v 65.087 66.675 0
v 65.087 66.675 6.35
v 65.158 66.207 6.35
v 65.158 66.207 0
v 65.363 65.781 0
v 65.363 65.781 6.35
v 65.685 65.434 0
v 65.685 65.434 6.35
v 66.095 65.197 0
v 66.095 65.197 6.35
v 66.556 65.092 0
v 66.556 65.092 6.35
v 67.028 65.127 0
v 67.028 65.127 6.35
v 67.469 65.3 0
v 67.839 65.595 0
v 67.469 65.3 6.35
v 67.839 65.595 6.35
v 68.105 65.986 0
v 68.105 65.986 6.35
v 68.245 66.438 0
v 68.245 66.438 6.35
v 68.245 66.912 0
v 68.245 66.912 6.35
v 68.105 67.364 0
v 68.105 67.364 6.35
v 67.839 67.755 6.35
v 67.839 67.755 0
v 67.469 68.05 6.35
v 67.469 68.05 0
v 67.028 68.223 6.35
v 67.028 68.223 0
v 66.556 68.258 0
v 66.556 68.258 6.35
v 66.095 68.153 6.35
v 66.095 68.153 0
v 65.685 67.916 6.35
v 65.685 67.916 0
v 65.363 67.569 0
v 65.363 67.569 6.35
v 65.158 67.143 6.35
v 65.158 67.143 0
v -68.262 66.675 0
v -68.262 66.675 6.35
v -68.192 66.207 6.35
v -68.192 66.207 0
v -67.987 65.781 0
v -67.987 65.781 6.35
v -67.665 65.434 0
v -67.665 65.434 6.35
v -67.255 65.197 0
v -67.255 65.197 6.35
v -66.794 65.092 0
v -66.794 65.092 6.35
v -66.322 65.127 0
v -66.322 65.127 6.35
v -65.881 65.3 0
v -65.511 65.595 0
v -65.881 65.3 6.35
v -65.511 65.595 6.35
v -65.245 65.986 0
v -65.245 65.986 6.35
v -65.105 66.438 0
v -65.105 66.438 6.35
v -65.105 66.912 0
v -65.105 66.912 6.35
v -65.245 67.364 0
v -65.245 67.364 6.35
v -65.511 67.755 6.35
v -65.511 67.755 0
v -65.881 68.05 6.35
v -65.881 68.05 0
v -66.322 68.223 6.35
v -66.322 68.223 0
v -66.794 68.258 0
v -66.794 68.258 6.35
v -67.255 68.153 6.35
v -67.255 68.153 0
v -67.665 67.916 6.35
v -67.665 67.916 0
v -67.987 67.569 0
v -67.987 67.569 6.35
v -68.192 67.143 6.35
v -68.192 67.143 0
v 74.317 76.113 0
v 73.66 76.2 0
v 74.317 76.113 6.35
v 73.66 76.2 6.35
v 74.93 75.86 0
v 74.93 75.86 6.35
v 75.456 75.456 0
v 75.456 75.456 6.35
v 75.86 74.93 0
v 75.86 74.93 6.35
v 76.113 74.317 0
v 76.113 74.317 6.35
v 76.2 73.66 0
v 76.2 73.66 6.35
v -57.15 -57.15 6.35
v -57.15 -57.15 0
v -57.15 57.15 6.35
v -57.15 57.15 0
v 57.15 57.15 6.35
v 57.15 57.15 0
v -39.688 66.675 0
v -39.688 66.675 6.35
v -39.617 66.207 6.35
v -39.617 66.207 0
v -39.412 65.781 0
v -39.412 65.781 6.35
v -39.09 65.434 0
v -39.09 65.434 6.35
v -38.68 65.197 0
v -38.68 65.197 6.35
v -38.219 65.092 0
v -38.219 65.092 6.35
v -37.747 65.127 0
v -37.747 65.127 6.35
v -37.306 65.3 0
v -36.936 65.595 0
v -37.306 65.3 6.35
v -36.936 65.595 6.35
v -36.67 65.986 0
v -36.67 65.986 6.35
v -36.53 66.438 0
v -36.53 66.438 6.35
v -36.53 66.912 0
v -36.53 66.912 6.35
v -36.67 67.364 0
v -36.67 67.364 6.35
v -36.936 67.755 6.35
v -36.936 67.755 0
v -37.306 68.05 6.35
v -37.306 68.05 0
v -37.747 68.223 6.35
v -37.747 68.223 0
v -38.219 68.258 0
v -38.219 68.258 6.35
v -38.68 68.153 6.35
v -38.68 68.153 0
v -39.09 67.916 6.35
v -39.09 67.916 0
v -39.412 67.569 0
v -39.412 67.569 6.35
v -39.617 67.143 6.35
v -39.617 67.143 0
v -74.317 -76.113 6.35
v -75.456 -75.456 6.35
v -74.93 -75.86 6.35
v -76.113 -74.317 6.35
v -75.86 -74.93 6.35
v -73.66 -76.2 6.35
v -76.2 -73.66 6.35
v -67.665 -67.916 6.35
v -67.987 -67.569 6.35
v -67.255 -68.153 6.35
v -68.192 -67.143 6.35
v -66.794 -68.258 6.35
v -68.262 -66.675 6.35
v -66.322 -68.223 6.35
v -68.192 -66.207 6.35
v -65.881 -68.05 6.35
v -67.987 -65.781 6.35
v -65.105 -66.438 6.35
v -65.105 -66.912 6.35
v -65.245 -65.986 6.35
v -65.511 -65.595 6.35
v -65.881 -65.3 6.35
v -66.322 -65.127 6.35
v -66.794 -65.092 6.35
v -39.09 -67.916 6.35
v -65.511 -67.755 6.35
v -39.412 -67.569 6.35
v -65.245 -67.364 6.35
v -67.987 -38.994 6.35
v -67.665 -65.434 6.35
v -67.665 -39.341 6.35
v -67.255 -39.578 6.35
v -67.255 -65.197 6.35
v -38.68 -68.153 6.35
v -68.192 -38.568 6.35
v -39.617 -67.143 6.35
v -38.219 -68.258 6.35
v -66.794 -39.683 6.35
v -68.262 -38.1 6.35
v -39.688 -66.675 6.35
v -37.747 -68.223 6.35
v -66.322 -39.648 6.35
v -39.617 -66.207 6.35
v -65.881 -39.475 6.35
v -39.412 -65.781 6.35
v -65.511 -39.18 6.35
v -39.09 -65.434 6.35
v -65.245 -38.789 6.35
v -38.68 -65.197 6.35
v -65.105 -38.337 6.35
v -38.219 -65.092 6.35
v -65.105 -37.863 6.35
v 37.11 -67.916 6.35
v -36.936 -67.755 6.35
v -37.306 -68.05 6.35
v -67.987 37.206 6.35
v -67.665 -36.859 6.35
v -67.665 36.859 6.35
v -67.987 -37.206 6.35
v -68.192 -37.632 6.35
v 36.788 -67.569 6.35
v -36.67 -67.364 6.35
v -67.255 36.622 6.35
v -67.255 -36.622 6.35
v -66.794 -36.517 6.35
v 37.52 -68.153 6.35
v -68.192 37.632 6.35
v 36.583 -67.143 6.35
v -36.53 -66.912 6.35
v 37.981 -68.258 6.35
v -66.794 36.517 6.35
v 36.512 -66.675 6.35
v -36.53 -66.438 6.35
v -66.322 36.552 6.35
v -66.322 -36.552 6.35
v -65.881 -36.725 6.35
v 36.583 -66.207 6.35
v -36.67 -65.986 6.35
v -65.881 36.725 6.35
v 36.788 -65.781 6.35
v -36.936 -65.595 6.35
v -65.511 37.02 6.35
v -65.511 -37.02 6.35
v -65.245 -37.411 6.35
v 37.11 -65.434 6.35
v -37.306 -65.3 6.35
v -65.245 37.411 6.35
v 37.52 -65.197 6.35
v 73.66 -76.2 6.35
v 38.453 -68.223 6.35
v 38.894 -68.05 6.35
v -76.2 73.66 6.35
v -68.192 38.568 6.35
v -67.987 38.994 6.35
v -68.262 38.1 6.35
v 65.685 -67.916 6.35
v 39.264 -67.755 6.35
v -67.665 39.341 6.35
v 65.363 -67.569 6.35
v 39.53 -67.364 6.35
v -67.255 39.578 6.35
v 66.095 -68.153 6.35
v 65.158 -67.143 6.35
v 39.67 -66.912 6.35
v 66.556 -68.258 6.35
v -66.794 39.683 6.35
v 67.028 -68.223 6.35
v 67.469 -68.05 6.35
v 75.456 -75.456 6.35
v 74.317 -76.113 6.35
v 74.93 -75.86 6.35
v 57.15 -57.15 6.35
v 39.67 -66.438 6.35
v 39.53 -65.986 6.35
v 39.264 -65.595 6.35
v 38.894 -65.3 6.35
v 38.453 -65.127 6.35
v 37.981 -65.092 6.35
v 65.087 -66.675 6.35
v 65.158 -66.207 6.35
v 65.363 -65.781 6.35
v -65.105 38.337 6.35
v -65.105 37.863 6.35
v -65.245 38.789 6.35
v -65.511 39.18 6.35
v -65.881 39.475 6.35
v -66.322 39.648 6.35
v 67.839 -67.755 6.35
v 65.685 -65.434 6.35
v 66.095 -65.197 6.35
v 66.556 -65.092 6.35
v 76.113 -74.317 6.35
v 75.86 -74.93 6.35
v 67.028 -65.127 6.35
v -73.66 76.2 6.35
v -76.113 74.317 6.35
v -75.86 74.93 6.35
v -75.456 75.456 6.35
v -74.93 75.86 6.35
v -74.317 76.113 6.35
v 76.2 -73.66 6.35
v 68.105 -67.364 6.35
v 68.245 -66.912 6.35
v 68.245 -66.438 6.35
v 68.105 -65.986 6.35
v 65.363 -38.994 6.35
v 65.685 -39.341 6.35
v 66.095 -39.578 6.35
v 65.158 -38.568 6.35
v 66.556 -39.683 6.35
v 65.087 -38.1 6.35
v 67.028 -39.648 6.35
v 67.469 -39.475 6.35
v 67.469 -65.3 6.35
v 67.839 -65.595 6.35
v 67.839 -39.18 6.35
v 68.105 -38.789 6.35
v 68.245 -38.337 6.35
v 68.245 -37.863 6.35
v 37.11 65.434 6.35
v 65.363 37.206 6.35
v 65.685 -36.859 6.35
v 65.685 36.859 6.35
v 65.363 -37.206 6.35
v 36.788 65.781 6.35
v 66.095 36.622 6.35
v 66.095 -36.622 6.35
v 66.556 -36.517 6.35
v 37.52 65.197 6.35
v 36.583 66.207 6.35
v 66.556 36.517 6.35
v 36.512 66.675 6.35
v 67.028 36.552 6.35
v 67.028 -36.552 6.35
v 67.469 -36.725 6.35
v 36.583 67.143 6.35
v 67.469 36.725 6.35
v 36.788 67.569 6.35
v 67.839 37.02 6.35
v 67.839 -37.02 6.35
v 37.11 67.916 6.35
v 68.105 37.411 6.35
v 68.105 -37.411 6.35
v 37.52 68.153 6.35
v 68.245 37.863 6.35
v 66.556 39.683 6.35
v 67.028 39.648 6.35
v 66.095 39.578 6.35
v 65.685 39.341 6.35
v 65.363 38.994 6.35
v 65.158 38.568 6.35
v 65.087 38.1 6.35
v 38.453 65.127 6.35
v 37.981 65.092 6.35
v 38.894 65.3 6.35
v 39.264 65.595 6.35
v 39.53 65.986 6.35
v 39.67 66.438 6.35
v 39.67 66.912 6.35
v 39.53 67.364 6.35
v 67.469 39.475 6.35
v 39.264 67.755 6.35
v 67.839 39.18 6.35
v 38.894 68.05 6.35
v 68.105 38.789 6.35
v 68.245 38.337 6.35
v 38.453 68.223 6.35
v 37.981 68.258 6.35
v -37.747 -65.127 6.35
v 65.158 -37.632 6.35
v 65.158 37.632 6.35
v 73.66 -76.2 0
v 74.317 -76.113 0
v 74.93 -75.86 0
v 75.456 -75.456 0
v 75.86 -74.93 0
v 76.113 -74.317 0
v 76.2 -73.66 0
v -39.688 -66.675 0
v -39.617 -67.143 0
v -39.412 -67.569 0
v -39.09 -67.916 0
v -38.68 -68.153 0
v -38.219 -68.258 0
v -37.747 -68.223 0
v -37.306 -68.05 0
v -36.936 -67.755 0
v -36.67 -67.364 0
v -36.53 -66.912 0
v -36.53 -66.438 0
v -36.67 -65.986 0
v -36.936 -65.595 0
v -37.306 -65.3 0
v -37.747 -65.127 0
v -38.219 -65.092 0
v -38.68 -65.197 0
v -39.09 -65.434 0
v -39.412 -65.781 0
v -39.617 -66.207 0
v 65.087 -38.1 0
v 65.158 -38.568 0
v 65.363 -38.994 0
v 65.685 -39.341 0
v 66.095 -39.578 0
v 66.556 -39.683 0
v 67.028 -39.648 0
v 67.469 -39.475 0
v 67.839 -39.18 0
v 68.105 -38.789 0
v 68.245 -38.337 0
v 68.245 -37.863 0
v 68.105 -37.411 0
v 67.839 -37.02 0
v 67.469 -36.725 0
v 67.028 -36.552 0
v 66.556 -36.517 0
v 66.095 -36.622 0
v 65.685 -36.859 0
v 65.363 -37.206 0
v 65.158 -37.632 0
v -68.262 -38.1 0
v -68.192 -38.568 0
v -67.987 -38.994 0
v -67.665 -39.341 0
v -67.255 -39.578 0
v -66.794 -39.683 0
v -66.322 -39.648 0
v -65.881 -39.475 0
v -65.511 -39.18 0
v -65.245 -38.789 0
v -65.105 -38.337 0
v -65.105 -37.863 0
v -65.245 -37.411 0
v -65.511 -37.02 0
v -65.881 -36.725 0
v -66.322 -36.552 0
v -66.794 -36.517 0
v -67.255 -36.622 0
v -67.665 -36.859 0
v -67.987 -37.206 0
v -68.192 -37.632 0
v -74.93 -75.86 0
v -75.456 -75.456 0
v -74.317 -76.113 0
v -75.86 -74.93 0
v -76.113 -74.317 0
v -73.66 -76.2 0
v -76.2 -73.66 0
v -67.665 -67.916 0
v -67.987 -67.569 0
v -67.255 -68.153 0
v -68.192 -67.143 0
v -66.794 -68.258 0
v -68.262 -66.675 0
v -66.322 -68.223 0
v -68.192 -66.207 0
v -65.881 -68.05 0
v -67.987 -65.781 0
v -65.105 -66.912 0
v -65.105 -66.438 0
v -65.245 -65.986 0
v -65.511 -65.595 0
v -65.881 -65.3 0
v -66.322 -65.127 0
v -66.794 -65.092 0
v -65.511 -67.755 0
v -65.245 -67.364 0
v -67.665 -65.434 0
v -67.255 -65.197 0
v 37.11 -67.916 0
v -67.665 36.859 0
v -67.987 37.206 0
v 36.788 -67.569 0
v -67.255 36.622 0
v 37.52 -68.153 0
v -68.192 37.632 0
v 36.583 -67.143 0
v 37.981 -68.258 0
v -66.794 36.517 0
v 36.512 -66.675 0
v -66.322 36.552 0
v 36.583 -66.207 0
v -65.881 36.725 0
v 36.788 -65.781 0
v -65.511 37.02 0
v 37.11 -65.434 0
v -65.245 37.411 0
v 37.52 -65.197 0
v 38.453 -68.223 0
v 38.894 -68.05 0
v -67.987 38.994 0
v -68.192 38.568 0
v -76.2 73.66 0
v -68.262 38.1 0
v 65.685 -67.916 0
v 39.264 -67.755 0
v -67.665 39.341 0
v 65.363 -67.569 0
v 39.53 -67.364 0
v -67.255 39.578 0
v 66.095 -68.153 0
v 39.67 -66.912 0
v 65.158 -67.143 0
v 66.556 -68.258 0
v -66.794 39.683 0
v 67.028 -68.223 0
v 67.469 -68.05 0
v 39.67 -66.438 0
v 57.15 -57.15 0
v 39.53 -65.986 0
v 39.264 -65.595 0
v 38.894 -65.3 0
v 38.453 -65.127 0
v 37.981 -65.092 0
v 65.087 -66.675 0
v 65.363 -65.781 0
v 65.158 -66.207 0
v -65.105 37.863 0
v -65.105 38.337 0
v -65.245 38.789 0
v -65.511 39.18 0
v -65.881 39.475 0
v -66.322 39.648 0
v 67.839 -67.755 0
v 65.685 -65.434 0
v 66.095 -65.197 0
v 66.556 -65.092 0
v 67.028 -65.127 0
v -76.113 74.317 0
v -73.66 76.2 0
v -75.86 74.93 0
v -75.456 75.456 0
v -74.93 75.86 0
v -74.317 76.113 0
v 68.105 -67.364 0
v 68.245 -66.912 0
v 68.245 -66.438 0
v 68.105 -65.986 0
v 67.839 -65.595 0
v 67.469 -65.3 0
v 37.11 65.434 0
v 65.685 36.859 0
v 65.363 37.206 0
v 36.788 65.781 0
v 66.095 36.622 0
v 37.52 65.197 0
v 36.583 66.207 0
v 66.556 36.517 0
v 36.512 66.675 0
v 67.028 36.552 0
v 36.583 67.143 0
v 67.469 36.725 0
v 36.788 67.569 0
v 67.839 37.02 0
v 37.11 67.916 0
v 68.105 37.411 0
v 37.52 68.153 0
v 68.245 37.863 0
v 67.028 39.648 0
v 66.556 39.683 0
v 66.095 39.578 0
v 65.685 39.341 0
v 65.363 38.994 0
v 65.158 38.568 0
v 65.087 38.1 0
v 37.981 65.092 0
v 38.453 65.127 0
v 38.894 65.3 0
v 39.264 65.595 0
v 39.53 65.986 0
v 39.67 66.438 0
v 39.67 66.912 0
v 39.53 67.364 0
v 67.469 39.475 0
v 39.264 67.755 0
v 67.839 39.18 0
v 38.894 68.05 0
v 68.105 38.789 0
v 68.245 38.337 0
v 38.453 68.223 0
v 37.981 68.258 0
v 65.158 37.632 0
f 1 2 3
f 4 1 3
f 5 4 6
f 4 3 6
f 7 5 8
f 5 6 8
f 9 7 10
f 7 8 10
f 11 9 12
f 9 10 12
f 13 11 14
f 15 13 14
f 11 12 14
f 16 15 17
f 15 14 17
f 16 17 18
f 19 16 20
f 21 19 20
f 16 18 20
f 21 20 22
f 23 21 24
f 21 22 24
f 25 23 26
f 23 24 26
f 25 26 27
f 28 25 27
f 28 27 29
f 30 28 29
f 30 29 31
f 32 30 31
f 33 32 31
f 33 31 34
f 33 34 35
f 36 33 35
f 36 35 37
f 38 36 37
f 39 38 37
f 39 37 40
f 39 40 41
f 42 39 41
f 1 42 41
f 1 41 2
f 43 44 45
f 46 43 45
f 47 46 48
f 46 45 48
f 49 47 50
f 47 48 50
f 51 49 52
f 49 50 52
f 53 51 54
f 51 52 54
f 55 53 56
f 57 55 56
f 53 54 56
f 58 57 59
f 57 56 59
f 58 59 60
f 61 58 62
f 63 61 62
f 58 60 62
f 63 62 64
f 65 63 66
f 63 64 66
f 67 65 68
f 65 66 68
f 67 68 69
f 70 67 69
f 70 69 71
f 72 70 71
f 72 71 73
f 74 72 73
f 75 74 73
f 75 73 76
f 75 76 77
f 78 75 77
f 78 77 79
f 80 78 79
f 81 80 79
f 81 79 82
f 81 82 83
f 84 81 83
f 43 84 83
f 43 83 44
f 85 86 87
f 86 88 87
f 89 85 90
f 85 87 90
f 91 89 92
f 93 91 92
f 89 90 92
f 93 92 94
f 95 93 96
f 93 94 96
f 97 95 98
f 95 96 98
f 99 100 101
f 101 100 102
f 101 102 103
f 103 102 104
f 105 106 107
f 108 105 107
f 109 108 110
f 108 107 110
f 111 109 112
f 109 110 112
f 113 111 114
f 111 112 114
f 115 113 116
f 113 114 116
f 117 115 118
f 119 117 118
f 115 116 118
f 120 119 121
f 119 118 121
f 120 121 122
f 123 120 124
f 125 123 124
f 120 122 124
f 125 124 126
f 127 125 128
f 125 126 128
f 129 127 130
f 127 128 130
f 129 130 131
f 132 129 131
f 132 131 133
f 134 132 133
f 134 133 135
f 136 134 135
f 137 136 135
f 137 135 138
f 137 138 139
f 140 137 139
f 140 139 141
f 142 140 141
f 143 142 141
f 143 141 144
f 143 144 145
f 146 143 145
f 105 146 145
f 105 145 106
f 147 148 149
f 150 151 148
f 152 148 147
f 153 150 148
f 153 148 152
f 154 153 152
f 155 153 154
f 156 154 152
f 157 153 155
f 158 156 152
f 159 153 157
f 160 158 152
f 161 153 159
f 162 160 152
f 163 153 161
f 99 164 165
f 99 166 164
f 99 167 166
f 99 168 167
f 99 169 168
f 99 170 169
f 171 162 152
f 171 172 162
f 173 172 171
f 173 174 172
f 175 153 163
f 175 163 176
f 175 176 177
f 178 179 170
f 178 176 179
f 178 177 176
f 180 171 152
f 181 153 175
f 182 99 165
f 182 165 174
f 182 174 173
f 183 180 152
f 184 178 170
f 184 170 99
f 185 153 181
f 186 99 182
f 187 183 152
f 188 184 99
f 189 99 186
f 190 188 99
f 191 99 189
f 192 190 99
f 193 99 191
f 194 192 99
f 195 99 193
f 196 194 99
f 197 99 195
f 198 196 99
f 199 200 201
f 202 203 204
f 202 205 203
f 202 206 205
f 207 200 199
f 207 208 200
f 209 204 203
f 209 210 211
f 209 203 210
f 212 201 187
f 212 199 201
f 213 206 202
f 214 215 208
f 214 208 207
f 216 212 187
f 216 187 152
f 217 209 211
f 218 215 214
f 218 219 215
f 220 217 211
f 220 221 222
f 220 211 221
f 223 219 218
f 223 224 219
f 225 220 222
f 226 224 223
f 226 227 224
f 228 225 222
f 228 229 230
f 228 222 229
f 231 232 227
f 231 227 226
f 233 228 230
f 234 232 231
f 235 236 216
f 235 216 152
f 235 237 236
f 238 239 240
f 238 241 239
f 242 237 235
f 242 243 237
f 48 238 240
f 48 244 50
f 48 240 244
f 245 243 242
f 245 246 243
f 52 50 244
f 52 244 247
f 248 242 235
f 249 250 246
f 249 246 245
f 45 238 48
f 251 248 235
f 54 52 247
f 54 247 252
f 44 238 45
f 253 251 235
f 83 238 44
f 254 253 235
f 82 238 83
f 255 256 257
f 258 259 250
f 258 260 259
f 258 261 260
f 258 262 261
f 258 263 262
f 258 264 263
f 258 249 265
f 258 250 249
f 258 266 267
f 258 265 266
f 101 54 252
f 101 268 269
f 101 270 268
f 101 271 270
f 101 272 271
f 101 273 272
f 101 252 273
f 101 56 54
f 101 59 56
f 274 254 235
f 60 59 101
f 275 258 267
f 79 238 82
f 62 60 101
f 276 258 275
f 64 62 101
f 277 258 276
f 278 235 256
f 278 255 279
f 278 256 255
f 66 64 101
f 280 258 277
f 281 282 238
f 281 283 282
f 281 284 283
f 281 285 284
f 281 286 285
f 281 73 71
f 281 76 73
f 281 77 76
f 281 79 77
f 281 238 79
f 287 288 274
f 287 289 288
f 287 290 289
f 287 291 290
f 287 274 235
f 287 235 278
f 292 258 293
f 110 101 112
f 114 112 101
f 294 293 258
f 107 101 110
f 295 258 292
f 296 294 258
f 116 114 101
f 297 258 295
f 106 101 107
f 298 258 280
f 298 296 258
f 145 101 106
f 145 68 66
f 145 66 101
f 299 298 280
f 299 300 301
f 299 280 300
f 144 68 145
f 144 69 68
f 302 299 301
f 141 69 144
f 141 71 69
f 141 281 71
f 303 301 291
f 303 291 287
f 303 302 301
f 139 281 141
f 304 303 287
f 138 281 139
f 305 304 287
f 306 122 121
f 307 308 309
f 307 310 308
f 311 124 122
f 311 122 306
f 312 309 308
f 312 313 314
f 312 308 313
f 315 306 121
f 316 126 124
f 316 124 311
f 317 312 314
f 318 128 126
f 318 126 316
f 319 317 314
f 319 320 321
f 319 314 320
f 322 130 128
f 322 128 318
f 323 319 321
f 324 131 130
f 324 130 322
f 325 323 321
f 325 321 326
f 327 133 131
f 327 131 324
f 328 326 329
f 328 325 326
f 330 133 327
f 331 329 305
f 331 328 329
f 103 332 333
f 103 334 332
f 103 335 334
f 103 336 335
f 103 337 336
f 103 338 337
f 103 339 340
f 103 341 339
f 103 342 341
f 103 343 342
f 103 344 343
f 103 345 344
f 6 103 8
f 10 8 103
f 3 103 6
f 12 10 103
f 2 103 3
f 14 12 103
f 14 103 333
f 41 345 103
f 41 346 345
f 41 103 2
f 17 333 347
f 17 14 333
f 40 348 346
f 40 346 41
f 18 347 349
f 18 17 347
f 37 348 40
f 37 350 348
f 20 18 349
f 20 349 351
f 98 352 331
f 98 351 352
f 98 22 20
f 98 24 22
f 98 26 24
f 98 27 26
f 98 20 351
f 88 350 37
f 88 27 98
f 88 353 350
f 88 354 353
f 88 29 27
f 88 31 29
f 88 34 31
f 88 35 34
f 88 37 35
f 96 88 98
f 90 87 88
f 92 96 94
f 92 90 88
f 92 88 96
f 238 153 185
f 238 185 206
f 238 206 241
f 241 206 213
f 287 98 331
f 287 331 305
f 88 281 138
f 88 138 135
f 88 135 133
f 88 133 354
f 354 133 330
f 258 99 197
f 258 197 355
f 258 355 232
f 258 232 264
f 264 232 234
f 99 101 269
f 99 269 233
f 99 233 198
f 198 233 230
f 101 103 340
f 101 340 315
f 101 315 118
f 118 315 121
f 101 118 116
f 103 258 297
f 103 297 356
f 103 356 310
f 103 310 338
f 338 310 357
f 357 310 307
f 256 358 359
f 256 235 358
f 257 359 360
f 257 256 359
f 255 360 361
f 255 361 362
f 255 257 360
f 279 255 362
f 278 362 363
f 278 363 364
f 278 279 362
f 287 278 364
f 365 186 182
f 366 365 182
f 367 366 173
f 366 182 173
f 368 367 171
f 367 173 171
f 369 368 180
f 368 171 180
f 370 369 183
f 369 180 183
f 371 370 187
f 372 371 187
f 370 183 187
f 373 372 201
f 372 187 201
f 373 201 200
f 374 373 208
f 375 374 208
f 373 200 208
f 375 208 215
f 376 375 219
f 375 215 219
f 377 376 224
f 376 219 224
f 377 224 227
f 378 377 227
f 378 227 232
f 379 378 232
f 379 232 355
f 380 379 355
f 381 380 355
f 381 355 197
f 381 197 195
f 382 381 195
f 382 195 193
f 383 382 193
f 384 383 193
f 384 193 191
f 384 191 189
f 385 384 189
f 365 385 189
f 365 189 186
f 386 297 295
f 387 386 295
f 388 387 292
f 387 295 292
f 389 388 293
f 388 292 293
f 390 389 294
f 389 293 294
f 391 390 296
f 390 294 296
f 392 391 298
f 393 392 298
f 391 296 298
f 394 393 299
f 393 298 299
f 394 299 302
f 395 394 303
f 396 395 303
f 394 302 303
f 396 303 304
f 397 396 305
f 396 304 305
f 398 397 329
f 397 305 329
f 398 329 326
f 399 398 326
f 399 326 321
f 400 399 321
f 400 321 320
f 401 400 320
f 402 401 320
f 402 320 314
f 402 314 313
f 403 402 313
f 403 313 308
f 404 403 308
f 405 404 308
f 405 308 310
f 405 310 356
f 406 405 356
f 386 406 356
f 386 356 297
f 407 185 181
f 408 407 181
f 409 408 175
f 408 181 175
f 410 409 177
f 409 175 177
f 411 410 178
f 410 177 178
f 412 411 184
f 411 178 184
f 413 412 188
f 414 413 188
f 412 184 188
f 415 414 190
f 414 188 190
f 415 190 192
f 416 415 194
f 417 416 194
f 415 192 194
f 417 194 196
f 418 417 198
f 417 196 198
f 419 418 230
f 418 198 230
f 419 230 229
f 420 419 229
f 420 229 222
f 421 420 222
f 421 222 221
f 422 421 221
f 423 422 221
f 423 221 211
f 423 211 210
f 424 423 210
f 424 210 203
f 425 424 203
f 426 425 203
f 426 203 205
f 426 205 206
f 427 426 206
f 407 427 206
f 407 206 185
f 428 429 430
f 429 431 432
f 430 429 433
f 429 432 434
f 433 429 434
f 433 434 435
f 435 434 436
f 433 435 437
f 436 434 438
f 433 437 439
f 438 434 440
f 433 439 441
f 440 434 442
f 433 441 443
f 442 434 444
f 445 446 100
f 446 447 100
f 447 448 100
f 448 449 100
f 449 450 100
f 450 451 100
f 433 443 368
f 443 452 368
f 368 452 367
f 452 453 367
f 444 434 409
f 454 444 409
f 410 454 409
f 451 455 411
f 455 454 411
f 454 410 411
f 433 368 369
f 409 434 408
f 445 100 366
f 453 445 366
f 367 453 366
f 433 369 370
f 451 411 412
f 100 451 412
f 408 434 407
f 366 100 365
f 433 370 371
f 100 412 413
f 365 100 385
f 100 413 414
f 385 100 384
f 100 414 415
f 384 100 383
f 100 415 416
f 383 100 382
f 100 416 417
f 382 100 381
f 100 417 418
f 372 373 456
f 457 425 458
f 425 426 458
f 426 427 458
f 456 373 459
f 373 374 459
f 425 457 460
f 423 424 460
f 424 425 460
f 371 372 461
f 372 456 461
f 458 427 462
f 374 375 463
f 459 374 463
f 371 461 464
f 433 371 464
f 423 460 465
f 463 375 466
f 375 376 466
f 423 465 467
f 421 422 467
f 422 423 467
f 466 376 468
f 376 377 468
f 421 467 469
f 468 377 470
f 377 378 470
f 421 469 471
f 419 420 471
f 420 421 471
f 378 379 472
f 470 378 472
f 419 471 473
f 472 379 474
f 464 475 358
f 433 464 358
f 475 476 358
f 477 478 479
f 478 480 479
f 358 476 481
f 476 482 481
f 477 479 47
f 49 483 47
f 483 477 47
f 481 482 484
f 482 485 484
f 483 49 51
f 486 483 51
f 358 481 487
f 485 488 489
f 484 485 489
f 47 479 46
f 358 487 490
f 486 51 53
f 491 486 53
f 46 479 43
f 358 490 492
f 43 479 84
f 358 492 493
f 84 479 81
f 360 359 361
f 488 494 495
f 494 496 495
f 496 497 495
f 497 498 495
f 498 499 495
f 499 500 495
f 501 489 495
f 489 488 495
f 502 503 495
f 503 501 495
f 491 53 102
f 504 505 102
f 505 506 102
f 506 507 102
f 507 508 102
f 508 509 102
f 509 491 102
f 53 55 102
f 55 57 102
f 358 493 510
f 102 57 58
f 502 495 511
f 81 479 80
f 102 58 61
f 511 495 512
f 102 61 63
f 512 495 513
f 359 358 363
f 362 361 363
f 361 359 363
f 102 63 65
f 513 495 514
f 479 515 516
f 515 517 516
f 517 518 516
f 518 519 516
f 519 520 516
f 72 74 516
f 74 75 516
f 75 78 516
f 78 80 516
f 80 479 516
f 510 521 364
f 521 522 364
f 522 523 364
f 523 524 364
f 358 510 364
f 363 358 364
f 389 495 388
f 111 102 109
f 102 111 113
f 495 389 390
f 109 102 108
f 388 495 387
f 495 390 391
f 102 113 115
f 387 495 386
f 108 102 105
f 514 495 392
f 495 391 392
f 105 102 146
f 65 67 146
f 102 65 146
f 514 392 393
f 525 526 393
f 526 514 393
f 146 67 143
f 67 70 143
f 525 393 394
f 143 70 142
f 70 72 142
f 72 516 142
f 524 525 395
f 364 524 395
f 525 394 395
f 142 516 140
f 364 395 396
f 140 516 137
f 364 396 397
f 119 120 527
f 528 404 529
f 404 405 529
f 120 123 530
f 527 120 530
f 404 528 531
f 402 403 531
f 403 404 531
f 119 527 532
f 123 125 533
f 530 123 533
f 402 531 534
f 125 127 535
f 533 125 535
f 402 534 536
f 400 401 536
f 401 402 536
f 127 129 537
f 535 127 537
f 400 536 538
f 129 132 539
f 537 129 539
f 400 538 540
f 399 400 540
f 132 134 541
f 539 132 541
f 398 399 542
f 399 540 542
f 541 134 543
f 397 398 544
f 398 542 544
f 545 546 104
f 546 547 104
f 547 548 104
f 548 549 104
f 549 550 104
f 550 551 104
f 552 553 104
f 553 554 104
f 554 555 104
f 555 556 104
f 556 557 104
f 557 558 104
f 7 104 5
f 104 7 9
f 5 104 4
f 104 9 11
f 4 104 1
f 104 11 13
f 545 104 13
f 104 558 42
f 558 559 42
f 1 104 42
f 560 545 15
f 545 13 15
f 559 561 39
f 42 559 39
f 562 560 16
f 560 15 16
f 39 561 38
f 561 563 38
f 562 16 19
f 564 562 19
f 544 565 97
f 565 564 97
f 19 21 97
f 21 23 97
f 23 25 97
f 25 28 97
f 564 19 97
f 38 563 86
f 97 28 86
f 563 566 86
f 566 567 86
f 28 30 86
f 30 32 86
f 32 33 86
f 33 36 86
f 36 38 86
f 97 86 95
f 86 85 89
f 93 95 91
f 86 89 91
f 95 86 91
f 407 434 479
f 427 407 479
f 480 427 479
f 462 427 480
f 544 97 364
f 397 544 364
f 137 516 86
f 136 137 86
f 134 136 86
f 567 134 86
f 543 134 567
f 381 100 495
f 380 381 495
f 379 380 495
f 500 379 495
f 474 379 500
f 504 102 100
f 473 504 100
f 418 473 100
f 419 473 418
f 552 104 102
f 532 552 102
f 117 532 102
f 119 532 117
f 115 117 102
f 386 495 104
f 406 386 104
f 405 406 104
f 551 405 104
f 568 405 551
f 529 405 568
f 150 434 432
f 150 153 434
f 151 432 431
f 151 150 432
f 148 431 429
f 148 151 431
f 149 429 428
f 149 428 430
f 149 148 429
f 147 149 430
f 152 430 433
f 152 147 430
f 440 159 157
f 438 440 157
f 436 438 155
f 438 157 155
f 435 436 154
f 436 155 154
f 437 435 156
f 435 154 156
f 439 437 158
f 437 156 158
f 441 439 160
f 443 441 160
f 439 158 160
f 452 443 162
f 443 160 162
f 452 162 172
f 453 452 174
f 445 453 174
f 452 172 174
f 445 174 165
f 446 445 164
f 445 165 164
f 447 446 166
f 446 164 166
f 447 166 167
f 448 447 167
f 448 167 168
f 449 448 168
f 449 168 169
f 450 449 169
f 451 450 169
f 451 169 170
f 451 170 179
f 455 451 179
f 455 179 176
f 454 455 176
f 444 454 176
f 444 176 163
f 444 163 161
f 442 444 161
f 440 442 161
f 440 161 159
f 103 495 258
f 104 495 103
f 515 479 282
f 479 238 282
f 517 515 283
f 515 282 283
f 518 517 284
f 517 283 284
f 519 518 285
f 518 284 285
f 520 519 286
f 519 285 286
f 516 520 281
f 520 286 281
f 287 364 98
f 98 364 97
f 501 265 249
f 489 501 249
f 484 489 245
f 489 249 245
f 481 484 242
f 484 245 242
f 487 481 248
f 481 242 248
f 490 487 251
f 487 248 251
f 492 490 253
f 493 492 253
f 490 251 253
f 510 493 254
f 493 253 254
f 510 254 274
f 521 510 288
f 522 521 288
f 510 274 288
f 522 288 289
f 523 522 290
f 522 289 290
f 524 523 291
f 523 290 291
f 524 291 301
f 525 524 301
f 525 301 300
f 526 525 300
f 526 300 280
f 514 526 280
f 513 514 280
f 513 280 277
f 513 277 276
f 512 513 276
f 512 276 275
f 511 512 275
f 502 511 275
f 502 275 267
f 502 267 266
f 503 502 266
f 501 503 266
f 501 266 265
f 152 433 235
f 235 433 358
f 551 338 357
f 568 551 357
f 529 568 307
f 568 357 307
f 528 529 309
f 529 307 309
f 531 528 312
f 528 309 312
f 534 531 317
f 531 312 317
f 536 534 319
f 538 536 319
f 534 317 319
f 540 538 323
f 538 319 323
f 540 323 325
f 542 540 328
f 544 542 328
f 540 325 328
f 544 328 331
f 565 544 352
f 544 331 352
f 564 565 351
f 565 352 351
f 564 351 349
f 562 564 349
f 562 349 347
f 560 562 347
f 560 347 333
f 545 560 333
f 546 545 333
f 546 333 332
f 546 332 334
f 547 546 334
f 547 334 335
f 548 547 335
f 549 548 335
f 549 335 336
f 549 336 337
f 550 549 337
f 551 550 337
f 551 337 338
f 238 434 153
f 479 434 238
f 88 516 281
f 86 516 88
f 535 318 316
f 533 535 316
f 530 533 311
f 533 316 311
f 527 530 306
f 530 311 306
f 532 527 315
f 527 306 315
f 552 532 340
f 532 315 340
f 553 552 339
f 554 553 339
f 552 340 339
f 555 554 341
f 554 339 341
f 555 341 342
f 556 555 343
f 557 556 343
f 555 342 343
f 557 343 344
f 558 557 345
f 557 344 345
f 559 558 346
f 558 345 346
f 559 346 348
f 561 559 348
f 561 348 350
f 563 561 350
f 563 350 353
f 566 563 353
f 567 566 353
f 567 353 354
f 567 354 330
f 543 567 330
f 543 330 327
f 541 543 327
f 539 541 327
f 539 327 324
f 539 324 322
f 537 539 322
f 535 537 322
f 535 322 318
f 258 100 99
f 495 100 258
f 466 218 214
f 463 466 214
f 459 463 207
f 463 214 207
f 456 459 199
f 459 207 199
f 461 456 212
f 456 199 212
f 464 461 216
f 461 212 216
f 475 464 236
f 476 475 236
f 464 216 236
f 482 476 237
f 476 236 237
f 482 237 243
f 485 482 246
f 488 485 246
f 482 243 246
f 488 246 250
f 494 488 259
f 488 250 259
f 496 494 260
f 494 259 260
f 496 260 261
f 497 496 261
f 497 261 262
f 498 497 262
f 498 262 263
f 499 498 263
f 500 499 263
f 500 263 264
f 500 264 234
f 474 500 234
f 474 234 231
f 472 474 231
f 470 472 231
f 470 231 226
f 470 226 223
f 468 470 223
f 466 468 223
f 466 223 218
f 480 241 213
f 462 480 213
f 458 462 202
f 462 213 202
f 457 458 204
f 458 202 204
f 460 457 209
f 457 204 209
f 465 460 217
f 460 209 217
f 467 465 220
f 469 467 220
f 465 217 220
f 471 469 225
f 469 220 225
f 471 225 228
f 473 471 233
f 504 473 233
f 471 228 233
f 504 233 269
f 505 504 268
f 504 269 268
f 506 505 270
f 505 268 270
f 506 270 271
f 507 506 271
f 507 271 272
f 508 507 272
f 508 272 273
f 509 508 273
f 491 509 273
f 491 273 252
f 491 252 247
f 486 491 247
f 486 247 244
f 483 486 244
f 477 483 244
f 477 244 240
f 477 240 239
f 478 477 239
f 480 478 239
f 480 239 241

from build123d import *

# Parameters (mm, degrees)
F0_W     = 152.4
F0_H     = 152.4
F0_W_2   = 114.3
F0_H_2   = 114.3
F1_DEPTH = 6.35
F2_D     = 3.175
F3_R     = 2.54


with BuildPart() as f1:
    # F0 (on Top) → F1 (new body)
    with BuildSketch(Plane.XY):
        Rectangle(F0_W, F0_H)
        Rectangle(F0_W_2, F0_H_2, mode=Mode.SUBTRACT)
    extrude(amount=F1_DEPTH)

    # F2 (through all)
    with Locations(Plane(origin=(0, 0, 0), x_dir=(1, 0, 0), z_dir=(0, 0, -1))):
        with Locations((-66.675, 66.675), (-38.1, 66.675), (38.1, 66.675), (66.675, 66.675), (66.675, 38.1), (66.675, -38.1), (66.675, -66.675), (38.1, -66.675), (-38.1, -66.675), (-66.675, -66.675), (-66.675, -38.1), (-66.675, 38.1)):
            Hole(F2_D / 2)

    # F3
    f3_edges = [f1.edges().sort_by_distance(p)[0] for p in [
        (-76.2, -76.2, 3.175),
        (76.2, -76.2, 3.175),
        (76.2, 76.2, 3.175),
        (-76.2, 76.2, 3.175),
    ]]
    fillet(f3_edges, radius=F3_R)


solid = f1.part
